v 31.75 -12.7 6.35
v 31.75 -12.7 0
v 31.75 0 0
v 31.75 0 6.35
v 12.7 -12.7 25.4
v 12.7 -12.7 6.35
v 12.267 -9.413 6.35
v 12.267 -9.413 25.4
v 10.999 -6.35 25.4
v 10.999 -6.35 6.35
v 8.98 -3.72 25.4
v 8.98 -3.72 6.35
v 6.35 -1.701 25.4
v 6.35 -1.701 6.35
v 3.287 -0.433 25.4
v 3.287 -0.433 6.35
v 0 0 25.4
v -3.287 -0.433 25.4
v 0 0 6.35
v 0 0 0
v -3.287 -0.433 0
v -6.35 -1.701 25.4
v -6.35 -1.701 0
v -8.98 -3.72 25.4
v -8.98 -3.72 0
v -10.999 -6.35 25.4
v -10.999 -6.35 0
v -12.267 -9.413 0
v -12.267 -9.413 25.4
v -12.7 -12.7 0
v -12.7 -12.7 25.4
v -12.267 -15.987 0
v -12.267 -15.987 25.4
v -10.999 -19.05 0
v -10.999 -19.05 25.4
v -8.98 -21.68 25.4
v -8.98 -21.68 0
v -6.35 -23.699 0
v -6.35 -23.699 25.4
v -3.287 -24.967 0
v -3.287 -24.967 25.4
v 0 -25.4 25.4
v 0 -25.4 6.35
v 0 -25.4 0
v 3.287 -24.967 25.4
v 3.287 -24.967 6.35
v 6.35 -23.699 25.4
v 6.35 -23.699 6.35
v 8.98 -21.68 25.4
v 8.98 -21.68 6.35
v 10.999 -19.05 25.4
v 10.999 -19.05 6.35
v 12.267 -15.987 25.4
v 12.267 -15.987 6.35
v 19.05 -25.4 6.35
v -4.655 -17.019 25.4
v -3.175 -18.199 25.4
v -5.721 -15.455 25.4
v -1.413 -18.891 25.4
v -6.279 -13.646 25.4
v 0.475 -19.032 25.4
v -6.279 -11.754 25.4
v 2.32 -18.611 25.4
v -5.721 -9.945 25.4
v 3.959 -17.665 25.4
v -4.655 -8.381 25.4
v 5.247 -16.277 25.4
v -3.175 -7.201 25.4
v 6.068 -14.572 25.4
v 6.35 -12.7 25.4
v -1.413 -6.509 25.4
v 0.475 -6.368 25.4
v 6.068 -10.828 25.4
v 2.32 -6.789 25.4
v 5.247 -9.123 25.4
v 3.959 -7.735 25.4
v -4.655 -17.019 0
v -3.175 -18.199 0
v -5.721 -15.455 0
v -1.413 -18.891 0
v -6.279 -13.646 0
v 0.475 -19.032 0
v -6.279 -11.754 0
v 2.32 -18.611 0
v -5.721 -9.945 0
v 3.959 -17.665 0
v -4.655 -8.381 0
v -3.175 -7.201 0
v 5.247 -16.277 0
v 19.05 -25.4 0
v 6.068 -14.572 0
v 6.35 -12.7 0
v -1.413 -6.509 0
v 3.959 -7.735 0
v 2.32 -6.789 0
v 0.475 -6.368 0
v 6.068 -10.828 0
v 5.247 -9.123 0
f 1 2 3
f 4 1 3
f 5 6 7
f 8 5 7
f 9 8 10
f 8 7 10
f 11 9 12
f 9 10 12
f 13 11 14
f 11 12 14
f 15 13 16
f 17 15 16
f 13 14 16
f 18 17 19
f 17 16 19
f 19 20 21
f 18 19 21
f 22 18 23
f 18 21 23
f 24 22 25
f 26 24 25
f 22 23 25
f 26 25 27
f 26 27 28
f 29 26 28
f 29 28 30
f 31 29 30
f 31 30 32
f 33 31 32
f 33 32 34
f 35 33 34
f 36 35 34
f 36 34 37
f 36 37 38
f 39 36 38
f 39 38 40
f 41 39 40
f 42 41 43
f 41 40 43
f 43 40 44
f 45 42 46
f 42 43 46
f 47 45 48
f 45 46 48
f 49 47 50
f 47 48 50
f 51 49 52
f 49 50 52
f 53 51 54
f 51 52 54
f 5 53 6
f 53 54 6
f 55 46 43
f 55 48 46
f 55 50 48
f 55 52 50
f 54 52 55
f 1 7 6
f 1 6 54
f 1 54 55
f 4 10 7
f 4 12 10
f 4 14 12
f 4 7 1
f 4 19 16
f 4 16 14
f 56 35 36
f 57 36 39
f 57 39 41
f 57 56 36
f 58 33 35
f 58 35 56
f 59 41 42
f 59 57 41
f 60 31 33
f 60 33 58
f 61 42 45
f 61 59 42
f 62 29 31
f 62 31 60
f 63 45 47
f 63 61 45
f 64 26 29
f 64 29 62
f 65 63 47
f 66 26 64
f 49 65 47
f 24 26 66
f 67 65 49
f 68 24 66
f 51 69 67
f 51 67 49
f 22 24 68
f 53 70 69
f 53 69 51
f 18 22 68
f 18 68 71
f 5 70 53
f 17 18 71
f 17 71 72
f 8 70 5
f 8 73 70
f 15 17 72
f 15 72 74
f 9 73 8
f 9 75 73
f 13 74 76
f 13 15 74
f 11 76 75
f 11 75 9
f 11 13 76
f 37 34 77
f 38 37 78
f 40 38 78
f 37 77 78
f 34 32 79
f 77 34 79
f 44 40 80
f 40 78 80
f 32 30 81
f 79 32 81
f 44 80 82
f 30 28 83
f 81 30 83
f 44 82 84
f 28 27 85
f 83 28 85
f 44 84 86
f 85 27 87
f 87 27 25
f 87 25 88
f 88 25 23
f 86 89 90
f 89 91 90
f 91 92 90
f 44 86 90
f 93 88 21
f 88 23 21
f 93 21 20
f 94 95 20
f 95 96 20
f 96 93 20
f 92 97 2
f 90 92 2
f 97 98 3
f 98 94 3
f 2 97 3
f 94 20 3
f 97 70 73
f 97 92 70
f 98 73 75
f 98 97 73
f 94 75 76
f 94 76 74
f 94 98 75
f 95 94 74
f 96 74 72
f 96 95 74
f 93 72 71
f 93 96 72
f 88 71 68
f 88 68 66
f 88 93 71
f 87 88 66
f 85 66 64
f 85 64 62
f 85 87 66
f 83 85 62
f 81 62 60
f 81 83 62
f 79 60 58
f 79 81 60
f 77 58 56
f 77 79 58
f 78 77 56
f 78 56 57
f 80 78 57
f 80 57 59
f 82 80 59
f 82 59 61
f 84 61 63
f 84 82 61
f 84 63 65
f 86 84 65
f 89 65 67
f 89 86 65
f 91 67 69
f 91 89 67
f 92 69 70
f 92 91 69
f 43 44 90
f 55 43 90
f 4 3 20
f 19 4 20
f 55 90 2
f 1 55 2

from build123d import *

# Parameters (mm, degrees)
F0_R     = 6.35
F1_DEPTH = 6.35
F2_R     = 12.7
F2_R_2   = 6.35
F3_DEPTH = 19.05


with BuildPart() as f1:
    # F0 (on Top) → F1 (new body)
    with BuildSketch(Plane.XY):
        with BuildLine():
            Line((31.75, 0), (0, 0))
            ThreePointArc((0, 0), (-12.7, -12.7), (0, -25.4))
            Line((0, -25.4), (19.05, -25.4))
            Line((19.05, -25.4), (31.75, -12.7))
            Line((31.75, -12.7), (31.75, 0))
        make_face()
        with Locations((0, -12.7)):
            Circle(F0_R, mode=Mode.SUBTRACT)
    extrude(amount=F1_DEPTH)

    # F2 (on face) → F3 (join)
    with BuildSketch(Plane.XY.offset(6.35)):
        with Locations((0, -12.7)):
            Circle(F2_R)
        with Locations((0, -12.7)):
            Circle(F2_R_2, mode=Mode.SUBTRACT)
    extrude(amount=F3_DEPTH)


solid = f1.part
